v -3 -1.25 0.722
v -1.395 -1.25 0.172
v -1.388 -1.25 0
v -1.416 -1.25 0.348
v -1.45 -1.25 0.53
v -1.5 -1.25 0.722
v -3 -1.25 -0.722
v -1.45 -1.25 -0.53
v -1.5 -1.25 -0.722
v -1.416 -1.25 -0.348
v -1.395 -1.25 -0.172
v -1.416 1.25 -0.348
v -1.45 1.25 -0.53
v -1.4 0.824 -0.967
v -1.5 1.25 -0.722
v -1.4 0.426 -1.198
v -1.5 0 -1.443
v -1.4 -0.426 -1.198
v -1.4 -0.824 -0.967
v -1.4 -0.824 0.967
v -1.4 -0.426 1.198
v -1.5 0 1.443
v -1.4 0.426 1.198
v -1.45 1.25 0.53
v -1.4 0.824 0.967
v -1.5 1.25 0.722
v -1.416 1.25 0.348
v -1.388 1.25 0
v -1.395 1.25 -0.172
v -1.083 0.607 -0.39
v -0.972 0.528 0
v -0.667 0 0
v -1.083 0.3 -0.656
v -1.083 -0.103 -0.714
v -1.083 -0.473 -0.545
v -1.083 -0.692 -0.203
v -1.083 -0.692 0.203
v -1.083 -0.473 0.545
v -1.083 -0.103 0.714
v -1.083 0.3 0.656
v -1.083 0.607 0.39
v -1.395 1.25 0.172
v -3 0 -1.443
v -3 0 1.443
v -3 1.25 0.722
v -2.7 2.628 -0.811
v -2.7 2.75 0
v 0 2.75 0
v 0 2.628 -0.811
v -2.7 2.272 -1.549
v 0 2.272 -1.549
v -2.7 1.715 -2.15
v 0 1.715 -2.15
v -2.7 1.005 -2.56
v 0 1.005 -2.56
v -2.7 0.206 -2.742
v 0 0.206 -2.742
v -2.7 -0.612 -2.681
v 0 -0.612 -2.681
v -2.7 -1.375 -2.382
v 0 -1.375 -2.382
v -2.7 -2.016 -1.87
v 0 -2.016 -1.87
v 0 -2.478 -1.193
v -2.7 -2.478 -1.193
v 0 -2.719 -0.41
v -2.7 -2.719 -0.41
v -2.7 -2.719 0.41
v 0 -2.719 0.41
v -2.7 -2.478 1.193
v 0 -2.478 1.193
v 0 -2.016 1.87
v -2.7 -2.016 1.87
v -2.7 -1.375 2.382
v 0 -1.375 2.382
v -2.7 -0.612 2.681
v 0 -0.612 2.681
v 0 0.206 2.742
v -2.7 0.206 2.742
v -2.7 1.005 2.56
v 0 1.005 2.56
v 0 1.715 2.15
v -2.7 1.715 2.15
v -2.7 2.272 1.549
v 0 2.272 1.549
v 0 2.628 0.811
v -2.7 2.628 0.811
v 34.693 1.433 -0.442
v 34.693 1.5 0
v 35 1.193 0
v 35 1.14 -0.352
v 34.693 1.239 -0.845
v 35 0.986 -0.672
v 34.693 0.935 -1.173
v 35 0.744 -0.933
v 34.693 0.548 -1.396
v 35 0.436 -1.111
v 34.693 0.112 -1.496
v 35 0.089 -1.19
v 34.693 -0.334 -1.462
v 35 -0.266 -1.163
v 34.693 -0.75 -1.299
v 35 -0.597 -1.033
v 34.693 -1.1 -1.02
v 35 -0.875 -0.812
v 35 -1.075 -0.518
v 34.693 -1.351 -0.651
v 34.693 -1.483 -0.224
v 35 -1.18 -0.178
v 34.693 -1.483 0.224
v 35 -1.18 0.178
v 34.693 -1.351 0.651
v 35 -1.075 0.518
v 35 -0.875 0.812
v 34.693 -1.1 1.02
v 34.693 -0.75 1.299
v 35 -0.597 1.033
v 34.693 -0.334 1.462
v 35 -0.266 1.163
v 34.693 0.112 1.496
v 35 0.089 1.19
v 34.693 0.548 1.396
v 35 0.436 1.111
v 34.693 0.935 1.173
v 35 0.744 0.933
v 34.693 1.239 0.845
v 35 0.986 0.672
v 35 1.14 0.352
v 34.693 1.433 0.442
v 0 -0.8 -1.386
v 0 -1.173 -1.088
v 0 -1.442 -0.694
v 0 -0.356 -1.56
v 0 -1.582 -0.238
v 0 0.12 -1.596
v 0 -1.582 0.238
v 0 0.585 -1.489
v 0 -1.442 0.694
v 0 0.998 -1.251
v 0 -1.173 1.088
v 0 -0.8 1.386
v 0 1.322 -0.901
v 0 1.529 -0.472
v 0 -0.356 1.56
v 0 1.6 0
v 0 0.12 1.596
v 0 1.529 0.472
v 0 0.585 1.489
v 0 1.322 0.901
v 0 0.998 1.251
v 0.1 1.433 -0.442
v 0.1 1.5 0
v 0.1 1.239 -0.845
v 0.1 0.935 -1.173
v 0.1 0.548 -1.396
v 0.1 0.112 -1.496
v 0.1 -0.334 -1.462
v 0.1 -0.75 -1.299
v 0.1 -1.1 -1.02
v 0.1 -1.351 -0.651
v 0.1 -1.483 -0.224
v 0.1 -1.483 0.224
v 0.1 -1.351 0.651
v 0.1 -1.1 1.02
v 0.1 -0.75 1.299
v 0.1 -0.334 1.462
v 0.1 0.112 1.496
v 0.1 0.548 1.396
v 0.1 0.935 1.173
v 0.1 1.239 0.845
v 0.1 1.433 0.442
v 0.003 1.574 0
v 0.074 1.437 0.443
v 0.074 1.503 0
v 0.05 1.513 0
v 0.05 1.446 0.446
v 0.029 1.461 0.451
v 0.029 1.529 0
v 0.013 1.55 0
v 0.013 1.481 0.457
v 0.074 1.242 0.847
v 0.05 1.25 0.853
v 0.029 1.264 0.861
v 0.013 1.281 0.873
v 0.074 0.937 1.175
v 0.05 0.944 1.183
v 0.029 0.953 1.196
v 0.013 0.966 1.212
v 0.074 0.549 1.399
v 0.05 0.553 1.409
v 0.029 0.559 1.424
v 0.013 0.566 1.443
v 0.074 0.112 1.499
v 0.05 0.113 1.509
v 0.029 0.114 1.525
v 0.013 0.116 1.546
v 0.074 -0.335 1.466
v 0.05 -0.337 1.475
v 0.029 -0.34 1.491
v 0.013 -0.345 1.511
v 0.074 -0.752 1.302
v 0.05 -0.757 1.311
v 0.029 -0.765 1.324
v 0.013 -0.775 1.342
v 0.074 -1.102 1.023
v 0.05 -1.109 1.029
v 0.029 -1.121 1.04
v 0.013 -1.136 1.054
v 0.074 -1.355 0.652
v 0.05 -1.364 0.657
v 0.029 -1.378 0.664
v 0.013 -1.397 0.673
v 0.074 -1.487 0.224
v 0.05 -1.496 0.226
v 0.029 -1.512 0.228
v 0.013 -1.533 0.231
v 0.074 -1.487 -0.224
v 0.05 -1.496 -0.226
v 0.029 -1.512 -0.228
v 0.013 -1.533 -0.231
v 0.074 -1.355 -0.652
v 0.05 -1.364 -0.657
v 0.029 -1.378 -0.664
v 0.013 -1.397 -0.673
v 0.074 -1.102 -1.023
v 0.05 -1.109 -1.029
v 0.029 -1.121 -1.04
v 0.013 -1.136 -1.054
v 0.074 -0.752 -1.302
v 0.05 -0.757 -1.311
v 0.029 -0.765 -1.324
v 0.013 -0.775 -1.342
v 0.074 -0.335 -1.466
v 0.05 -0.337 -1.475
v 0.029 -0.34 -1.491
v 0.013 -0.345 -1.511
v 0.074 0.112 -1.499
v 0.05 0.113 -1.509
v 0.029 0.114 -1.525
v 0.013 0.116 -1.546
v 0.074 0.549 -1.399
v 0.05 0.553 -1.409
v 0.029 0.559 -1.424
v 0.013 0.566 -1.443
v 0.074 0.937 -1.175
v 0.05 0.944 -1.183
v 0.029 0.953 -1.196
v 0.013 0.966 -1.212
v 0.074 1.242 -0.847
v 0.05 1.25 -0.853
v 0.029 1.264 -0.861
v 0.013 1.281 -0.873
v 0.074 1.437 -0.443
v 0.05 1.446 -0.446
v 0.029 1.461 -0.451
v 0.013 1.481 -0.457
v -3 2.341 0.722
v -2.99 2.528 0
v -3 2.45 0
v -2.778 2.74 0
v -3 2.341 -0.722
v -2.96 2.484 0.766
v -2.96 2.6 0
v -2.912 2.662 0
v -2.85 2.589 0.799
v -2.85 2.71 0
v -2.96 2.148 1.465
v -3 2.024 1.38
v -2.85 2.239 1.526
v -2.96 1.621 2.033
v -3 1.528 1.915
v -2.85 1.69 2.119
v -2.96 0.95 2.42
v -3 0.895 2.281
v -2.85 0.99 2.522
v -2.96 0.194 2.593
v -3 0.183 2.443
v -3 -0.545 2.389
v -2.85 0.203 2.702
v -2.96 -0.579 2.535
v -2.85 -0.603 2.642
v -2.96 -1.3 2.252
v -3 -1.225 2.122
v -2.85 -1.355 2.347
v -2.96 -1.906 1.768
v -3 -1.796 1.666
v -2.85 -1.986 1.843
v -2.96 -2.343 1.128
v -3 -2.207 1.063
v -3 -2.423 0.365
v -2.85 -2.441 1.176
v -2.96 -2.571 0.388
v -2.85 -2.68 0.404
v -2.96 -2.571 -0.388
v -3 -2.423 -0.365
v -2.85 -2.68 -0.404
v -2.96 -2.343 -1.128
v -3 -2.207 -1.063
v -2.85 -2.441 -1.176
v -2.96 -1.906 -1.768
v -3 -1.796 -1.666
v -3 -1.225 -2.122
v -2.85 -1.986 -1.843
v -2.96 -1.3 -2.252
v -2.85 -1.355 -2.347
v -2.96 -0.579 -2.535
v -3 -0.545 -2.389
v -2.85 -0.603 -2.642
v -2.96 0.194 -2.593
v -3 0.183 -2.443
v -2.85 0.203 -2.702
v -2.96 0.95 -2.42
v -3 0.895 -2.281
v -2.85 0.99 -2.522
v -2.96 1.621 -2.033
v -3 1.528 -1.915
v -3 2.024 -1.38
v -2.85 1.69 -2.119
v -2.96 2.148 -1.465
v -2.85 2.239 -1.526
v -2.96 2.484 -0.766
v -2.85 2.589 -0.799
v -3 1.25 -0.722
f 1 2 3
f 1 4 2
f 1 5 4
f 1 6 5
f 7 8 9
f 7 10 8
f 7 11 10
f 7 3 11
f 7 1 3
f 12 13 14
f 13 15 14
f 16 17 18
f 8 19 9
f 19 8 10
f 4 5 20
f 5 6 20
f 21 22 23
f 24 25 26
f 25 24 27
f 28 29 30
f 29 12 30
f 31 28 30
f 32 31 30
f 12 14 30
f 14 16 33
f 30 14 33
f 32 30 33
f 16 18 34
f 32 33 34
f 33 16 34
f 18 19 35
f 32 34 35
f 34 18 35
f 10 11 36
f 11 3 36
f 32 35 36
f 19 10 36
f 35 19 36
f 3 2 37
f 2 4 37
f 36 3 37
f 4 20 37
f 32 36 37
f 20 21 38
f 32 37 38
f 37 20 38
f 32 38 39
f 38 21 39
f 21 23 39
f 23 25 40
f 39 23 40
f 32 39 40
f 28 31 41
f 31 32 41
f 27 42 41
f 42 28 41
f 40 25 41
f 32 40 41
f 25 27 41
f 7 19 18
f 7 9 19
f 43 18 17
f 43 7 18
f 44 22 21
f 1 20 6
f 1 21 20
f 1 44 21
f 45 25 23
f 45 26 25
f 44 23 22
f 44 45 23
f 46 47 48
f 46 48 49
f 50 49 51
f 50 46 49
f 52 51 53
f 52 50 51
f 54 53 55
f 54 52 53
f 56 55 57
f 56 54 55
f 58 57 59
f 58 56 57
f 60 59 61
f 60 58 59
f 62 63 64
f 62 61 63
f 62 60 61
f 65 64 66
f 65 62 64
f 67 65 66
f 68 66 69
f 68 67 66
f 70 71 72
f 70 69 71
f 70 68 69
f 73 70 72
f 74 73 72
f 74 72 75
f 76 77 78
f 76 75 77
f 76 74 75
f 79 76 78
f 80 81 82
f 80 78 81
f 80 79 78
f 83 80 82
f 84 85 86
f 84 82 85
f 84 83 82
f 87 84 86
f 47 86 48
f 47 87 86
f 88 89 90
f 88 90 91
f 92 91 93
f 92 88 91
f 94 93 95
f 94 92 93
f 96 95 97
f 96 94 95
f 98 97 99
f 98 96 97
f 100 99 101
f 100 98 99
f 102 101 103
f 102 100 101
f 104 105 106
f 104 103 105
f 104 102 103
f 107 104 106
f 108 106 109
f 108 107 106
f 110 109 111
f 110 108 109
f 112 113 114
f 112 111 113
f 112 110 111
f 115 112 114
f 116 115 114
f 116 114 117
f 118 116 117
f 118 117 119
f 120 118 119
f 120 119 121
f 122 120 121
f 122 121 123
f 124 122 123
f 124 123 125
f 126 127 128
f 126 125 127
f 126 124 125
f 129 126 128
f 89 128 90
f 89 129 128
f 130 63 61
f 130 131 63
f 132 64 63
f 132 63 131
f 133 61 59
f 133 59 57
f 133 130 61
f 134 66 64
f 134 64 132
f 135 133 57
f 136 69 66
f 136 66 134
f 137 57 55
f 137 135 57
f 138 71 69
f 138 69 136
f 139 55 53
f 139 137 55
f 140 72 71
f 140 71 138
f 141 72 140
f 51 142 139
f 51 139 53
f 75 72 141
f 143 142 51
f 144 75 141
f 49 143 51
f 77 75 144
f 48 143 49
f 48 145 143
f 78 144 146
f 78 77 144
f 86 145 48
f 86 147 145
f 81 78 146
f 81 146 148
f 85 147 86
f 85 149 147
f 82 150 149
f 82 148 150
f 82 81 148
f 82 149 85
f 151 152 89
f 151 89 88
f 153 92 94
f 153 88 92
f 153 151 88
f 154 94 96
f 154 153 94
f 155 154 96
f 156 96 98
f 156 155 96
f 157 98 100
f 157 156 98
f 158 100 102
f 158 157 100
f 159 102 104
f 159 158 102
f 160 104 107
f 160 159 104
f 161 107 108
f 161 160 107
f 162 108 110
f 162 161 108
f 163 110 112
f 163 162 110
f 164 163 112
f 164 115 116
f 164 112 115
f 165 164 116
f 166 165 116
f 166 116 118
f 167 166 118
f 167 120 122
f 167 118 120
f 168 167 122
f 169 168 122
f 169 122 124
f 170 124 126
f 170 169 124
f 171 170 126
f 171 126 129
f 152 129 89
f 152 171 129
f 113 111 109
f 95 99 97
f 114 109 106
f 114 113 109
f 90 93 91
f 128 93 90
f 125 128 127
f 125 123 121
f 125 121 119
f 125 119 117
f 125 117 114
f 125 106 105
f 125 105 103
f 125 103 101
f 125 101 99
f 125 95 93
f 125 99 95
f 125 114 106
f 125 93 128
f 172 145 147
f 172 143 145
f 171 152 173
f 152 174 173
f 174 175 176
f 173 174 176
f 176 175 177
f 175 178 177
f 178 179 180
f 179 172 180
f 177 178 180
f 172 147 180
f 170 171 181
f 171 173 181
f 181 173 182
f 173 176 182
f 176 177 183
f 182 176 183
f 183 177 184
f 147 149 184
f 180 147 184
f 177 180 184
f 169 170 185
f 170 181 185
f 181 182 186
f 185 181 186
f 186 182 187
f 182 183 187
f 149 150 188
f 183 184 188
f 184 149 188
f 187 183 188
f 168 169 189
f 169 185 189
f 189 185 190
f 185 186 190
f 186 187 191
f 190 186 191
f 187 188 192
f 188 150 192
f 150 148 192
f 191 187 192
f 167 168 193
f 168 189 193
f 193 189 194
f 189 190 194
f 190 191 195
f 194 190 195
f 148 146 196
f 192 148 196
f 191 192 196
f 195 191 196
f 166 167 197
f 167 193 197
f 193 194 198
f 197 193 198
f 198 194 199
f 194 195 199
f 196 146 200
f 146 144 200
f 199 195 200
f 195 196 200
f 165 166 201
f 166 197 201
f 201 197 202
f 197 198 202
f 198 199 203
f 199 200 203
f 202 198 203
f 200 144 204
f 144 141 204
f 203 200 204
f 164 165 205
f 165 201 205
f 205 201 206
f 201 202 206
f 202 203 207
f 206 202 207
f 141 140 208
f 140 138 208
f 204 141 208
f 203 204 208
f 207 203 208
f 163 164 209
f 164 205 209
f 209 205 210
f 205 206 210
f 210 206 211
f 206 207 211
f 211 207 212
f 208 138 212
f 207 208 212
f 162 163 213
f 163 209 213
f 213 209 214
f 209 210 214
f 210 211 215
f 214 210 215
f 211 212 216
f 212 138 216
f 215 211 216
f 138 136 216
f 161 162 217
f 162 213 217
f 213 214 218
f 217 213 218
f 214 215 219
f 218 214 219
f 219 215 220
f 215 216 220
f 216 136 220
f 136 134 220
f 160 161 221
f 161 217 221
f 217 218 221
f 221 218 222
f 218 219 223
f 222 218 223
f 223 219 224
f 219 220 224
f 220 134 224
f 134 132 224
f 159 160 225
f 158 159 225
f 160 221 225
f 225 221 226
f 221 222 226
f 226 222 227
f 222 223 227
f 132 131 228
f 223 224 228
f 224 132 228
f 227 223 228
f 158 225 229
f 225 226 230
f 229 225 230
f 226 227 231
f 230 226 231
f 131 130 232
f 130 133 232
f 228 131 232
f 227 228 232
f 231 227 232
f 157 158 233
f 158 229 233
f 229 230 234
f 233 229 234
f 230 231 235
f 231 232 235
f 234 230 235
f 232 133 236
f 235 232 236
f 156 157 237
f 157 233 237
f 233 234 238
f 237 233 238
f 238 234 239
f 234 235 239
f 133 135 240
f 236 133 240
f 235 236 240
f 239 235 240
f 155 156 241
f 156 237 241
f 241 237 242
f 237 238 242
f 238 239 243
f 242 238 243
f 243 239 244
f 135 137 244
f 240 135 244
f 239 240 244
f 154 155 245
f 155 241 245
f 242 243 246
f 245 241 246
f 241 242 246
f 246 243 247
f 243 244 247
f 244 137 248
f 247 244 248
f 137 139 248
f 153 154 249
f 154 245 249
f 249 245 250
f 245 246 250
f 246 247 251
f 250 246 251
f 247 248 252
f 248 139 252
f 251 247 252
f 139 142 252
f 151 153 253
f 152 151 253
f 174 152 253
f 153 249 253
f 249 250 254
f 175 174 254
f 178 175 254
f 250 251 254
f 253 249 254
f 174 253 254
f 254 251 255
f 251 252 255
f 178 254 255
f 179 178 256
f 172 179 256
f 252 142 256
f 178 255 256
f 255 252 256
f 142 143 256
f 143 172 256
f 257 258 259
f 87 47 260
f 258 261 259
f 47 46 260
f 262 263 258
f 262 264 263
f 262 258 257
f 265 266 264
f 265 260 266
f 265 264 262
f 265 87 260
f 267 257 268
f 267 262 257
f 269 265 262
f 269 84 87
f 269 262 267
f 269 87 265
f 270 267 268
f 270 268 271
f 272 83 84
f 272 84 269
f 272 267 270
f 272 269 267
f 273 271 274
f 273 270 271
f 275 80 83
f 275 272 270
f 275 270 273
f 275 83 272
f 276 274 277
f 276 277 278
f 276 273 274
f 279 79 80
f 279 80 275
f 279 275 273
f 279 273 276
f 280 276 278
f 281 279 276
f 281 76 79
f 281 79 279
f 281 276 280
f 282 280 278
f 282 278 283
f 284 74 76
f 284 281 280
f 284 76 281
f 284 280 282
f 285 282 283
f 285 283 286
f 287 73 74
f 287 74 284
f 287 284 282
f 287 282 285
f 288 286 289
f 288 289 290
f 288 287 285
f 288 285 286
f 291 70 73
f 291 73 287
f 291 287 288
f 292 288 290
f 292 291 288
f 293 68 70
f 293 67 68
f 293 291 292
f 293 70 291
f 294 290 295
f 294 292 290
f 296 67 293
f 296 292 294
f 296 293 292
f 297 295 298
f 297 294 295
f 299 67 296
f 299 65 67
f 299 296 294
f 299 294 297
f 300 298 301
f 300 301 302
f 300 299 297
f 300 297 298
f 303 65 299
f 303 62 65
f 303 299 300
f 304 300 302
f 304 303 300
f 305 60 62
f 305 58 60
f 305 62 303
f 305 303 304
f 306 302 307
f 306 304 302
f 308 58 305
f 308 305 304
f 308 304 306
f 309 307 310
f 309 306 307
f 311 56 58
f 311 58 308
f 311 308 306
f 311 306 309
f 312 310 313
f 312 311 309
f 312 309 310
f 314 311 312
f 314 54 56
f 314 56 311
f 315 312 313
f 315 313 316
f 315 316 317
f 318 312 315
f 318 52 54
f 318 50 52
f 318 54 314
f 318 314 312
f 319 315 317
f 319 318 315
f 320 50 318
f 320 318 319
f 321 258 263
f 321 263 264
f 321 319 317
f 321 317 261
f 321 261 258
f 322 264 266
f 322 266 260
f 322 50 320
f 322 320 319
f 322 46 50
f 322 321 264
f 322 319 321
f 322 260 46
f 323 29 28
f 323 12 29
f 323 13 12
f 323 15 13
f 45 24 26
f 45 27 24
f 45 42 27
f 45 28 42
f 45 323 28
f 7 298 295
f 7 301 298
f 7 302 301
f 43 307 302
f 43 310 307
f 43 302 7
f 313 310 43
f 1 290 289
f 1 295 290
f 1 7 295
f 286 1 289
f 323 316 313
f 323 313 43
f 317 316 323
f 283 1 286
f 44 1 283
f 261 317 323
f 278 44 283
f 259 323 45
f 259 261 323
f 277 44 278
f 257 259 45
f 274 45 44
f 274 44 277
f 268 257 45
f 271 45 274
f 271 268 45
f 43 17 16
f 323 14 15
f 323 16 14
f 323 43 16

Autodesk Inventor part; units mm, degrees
ref_plane "YZ Plane" through (0, 0, 0) normal (1, 0, 0) x (0, 1, 0)
ref_plane "XZ Plane" through (0, 0, 0) normal (0, 1, 0) x (-1, 0, 0)
sketch "Sketch1" plane through (0, 0, 0) normal (0, 0, 1) x (1, 0, 0)
  line L0 (-0.6667, 0) -> (35, 0)
  line L1 (35, 0) -> (35, 1.5)
  line L2 (35, 1.5) -> (17, 1.5)
  line L3 (17, 1.5) -> (16.6932, 1.5)
  line L4 (16.6932, 1.5) -> (0, 1.5)
  line L5 (0, 1.5) -> (0, 2.75)
  line L6 (0, 2.75) -> (-3, 2.75)
  line L7 (-3, 2.75) -> (-3, 1.4434)
  line L8 (-3, 1.4434) -> (-1.5, 1.4434)
  line L9 (-1.5, 1.4434) -> (-0.6667, 0)
  line L10 (-9.6, 0) -> (36.6, 0) projected
  line L11 (0, -0.55) -> (0, 3.3) projected
  line L12 (17, 1.5) -> (0, 1.5) construction
  dimension "d1" = 18
  dimension "d2" = 0.3068
  dimension "d3" = 3
  dimension "d4" = 1.5
  dimension "d5" = 60
  dimension "d6" = 3
  dimension "d7" = 3
  dimension "d8" = 2.8868
  dimension "d9" = 5.5
  dimension "d26" = 35
revolve "Body" add sketch "Sketch1" angle 360 about axis through (-0.6667, 0, 0) along (1, 0, 0)
sketch "Sketch2" plane through (-3, 0, 0) normal (-1, 0, 0) x (0, 0, 1)
  circle A0 centre (0, 0) radius 1.4434 projected
  line L0 (0, -3.85) -> (0, 3.85) projected
  line L1 (-3.85, 0) -> (3.85, 0) projected
  line L2 (1.4434, 0) -> (0.7217, -1.25)
  line L3 (0.7217, -1.25) -> (-0.7217, -1.25)
  line L4 (-0.7217, -1.25) -> (-1.4434, 0)
  line L5 (-1.4434, 0) -> (-0.7217, 1.25)
  line L6 (-0.7217, 1.25) -> (0.7217, 1.25)
  line L7 (0.7217, 1.25) -> (1.4434, 0)
extrude "Slot" add sketch "Sketch2" against normal up to next contours L7 A0 | A0 L2 | L6 L0 A0 | A0 L0 L3 | L0 L6 A0 | A0 L3 L0 | L4 A0 | A0 L5
fillet "Fillet1" radius 0.3 1 edges at (-3, -2.75, 0)
thread "Thread" size "M3x0.5" class "6g" standard "ISO Metric profile" length 18
chamfer "Chamfer1" distance 0.3067 distance2 0.3067 1 edges at (35, -1.5, 0) measured on face at (35, -0.8773, -0.3972)
ref_plane "Work Plane1" through (29, 0, 0) normal (0, -1, 0) x (1, 0, 0)
fillet "Fillet2" radius 0.1 1 edges at (0, -1.5, 0)
equation "\"d1\" = GEL"
equation "\"d3\" = KOH"
equation "\"d4\" = INTI"
equation "\"d6\" = GD"
equation "\"d7\" = BDM"
equation "\"d8\" = 1.1547 * SW"
equation "\"d9\" = KOD"
equation "\"d26\" = NLG"
equation "\"d30\" = R"
equation "\"d17\" = RR"
equation "\"d13\" = GEL"
equation "\"d15\" = -0.5 * SPD + 0.5 * GD"
equation "\"d16\" = GUL"
equation "\"GD\" = NND"
equation "\"NLG\" = 35"
equation "\"GEL\" = 18"
equation "\"KOD\" = 5.5"
equation "\"KOH\" = 3"
equation "\"INTI\" = 1.5"
equation "\"GAL\" = 0.61345 * PTC"
equation "\"GUL\" = 0.61345 * PTC"
equation "\"BDM\" = NND"
equation "\"SW\" = 2.5"
equation "\"RR\" = 0.3"
equation "\"SPD\" = 2.38655"
equation "\"R\" = 0.1"
equation "\"TOA\" = 30deg"
equation "\"THREADDIA\" = 3"
equation "\"PTC\" = 0.5"
equation "\"NND\" = 3"
equation "\"E0\" = 1.155 * SW"
equation "\"GD1\" = THREADDIA - 1.2269 * PTC"
properties material "Steel, Mild"
